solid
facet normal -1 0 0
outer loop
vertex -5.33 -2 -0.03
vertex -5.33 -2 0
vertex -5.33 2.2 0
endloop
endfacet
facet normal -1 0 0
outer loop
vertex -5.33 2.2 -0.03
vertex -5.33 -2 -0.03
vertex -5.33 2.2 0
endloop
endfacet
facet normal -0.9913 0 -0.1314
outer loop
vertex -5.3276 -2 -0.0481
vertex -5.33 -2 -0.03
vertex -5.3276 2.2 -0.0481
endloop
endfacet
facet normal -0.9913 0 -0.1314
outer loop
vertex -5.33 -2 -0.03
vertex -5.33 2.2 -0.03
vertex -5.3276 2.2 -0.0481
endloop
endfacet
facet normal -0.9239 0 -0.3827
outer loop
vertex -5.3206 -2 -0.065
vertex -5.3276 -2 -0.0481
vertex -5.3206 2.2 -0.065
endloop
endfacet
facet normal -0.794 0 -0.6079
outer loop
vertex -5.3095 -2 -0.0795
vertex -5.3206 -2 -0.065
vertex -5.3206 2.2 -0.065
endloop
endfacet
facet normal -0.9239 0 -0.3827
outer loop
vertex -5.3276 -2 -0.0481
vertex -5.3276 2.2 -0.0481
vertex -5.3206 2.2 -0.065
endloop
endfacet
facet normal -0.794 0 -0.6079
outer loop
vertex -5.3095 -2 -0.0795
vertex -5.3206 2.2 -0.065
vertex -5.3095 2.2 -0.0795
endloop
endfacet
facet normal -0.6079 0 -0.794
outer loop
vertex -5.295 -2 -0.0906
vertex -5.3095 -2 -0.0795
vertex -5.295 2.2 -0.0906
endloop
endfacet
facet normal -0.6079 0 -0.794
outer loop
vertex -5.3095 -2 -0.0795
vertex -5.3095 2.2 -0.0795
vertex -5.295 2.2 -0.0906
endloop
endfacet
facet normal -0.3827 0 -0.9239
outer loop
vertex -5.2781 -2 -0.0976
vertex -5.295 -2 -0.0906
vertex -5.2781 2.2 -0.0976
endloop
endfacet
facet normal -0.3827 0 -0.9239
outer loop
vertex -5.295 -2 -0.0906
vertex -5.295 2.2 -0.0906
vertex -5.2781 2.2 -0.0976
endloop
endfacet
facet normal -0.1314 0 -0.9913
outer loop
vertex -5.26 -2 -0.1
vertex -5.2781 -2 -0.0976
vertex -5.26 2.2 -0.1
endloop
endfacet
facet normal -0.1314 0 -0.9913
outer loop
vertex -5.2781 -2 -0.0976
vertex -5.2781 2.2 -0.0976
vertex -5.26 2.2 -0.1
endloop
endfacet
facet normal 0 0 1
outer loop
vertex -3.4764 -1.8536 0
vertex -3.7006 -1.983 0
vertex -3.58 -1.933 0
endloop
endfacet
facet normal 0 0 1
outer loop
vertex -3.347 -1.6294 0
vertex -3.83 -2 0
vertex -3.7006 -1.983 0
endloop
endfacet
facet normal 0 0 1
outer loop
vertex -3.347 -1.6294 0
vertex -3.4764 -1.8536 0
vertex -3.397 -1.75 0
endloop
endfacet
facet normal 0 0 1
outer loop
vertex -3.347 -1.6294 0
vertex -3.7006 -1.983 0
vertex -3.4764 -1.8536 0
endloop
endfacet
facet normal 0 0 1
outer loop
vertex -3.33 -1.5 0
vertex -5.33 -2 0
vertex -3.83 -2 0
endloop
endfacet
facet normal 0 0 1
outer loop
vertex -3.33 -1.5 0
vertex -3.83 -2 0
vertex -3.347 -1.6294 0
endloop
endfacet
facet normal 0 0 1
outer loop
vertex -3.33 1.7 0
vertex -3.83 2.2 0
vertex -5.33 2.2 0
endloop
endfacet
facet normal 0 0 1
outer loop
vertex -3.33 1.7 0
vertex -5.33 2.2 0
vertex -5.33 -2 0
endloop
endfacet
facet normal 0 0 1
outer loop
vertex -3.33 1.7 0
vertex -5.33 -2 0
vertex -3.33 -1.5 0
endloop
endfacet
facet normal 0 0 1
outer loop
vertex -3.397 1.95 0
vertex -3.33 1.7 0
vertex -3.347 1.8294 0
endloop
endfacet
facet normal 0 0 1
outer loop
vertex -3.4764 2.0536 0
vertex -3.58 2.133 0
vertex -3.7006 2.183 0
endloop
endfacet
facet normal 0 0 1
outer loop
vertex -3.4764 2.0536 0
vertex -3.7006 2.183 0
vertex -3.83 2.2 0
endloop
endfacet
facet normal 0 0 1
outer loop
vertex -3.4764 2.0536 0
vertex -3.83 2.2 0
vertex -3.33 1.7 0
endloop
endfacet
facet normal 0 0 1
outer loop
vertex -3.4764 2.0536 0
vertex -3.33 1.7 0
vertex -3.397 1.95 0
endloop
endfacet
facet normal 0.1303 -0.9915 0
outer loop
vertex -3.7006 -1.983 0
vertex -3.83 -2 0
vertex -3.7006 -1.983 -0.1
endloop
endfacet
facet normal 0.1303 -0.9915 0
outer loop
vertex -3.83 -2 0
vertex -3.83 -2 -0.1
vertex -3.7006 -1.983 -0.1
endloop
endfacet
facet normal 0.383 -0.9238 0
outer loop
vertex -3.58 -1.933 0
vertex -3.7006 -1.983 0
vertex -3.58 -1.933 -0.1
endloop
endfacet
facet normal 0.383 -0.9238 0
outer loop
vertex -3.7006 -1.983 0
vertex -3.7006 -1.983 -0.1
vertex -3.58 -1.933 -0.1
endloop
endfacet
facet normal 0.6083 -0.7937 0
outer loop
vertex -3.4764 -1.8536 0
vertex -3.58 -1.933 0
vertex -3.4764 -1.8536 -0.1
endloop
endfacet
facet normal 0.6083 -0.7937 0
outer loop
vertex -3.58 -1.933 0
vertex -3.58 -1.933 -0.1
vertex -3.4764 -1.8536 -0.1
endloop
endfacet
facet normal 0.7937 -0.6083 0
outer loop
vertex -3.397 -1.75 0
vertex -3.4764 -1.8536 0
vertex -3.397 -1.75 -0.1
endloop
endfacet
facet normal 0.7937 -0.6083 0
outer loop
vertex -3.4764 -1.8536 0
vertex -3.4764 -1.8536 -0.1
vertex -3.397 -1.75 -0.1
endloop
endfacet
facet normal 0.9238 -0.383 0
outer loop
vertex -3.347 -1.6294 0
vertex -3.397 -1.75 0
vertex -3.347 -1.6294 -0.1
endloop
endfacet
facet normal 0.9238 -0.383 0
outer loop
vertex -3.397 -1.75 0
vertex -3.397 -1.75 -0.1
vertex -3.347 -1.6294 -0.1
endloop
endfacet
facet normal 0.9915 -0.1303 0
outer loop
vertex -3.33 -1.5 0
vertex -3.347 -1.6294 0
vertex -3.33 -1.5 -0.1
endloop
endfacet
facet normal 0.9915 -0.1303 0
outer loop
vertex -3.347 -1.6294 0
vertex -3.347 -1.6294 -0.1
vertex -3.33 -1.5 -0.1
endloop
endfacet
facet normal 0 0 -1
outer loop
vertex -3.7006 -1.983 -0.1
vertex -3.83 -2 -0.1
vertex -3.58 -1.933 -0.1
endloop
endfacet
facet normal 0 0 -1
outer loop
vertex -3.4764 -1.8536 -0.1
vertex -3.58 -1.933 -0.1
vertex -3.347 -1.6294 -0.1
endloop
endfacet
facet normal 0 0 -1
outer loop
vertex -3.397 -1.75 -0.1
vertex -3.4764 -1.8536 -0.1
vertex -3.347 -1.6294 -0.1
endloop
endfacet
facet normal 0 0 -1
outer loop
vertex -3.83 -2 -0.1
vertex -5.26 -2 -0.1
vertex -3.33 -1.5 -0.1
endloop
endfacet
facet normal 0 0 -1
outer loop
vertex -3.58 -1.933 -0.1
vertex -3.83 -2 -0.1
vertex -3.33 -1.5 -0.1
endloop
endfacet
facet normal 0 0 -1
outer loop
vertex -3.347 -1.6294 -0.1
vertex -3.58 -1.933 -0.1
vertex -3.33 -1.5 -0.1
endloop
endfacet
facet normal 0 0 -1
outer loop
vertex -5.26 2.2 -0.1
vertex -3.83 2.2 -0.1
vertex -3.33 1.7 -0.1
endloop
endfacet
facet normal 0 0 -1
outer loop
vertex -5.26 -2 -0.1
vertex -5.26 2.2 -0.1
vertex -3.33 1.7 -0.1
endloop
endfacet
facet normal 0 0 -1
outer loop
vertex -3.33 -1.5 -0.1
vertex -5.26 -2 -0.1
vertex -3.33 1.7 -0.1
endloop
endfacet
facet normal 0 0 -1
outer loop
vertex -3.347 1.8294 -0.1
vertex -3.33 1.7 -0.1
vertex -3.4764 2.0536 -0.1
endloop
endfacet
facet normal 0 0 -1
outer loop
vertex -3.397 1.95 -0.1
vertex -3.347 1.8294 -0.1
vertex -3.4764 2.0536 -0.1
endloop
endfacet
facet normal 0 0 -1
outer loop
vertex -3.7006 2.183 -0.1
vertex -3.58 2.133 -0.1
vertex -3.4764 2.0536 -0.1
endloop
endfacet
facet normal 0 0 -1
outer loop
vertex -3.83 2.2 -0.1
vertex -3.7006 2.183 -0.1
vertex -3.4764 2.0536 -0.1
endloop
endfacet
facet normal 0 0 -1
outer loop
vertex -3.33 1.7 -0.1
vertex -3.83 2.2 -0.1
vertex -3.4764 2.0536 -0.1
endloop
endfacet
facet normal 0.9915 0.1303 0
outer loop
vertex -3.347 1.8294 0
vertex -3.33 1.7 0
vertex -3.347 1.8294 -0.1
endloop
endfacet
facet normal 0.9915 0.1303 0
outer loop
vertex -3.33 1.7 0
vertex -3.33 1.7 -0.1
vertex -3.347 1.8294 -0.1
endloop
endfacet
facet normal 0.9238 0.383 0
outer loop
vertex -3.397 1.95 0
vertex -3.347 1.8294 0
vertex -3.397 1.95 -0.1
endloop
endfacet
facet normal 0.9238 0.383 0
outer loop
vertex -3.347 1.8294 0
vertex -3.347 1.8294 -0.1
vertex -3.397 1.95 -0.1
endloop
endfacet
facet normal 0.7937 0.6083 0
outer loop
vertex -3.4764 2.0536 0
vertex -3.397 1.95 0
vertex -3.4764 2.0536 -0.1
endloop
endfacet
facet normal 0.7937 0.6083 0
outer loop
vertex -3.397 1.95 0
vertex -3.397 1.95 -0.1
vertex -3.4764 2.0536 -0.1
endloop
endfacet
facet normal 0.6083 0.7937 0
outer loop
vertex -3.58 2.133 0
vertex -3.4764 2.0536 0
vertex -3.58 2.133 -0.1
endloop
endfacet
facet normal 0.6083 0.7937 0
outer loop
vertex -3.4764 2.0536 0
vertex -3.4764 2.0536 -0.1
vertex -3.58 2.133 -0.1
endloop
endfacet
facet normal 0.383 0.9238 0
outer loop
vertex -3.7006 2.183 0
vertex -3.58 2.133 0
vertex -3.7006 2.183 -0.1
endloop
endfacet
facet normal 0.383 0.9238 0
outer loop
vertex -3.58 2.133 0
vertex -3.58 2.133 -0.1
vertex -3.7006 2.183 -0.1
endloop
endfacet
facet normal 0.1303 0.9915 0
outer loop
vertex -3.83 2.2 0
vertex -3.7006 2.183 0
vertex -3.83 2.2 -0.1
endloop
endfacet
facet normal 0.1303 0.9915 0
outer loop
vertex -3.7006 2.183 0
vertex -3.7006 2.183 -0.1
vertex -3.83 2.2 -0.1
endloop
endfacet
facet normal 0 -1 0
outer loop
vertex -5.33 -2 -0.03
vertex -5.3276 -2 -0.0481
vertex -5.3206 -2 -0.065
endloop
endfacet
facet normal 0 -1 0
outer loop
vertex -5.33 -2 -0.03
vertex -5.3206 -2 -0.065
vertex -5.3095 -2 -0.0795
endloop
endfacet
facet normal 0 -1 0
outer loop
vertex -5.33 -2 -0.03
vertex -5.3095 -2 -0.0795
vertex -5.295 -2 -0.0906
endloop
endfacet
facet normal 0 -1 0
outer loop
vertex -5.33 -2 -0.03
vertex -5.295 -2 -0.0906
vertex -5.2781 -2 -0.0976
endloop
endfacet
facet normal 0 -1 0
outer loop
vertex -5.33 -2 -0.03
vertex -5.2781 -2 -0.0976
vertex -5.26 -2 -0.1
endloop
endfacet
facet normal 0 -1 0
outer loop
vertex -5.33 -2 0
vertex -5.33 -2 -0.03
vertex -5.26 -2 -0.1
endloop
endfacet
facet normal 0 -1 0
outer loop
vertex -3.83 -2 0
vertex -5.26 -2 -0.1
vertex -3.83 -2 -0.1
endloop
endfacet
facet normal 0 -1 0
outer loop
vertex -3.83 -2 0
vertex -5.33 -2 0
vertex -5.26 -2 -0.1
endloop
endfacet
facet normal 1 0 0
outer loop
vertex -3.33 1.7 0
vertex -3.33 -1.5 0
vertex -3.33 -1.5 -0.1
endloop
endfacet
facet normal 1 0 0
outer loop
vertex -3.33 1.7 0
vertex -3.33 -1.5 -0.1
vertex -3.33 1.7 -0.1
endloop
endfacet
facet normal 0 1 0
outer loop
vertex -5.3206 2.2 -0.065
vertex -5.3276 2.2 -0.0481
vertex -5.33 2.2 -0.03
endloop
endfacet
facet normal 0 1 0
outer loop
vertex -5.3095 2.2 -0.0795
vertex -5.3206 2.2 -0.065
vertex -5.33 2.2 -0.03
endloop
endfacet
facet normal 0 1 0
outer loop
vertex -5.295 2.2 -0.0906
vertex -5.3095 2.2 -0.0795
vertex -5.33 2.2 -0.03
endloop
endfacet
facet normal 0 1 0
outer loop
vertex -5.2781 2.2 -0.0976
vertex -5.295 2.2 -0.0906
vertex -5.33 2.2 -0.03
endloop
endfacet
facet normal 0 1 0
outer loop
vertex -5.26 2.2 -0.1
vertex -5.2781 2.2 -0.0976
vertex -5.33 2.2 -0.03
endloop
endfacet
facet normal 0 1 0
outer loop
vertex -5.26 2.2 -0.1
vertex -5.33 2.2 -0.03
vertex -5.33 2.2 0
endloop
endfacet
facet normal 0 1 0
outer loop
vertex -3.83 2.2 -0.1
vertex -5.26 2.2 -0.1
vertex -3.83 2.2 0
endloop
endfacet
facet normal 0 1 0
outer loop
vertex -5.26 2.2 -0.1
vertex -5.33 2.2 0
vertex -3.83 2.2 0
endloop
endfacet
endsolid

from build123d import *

# Parameters (mm, degrees)
SKETCH006_W  = 2
SKETCH006_H  = 4.2
PAD009_DEPTH = 0.1
FILLET010_R  = 0.07
FILLET011_R  = 0.5
FILLET012_R  = 0.5


with BuildPart() as part:
    # Sketch006 → Pad009 (new body)
    with BuildSketch(Plane.XY):
        with Locations((-4.33, 0.1)):
            Rectangle(SKETCH006_W, SKETCH006_H)
    extrude(amount=-PAD009_DEPTH)

    # Fillet010
    fillet010_edges = [part.edges().sort_by_distance(p)[0] for p in [
        (-5.33, 0.1, -0.1),
    ]]
    fillet(fillet010_edges, radius=FILLET010_R)

    # Fillet011
    fillet011_edges = [part.edges().sort_by_distance(p)[0] for p in [
        (-3.33, -2, -0.05),
    ]]
    fillet(fillet011_edges, radius=FILLET011_R)

    # Fillet012
    fillet012_edges = [part.edges().sort_by_distance(p)[0] for p in [
        (-3.33, 2.2, -0.05),
    ]]
    fillet(fillet012_edges, radius=FILLET012_R)


solid = part.part
